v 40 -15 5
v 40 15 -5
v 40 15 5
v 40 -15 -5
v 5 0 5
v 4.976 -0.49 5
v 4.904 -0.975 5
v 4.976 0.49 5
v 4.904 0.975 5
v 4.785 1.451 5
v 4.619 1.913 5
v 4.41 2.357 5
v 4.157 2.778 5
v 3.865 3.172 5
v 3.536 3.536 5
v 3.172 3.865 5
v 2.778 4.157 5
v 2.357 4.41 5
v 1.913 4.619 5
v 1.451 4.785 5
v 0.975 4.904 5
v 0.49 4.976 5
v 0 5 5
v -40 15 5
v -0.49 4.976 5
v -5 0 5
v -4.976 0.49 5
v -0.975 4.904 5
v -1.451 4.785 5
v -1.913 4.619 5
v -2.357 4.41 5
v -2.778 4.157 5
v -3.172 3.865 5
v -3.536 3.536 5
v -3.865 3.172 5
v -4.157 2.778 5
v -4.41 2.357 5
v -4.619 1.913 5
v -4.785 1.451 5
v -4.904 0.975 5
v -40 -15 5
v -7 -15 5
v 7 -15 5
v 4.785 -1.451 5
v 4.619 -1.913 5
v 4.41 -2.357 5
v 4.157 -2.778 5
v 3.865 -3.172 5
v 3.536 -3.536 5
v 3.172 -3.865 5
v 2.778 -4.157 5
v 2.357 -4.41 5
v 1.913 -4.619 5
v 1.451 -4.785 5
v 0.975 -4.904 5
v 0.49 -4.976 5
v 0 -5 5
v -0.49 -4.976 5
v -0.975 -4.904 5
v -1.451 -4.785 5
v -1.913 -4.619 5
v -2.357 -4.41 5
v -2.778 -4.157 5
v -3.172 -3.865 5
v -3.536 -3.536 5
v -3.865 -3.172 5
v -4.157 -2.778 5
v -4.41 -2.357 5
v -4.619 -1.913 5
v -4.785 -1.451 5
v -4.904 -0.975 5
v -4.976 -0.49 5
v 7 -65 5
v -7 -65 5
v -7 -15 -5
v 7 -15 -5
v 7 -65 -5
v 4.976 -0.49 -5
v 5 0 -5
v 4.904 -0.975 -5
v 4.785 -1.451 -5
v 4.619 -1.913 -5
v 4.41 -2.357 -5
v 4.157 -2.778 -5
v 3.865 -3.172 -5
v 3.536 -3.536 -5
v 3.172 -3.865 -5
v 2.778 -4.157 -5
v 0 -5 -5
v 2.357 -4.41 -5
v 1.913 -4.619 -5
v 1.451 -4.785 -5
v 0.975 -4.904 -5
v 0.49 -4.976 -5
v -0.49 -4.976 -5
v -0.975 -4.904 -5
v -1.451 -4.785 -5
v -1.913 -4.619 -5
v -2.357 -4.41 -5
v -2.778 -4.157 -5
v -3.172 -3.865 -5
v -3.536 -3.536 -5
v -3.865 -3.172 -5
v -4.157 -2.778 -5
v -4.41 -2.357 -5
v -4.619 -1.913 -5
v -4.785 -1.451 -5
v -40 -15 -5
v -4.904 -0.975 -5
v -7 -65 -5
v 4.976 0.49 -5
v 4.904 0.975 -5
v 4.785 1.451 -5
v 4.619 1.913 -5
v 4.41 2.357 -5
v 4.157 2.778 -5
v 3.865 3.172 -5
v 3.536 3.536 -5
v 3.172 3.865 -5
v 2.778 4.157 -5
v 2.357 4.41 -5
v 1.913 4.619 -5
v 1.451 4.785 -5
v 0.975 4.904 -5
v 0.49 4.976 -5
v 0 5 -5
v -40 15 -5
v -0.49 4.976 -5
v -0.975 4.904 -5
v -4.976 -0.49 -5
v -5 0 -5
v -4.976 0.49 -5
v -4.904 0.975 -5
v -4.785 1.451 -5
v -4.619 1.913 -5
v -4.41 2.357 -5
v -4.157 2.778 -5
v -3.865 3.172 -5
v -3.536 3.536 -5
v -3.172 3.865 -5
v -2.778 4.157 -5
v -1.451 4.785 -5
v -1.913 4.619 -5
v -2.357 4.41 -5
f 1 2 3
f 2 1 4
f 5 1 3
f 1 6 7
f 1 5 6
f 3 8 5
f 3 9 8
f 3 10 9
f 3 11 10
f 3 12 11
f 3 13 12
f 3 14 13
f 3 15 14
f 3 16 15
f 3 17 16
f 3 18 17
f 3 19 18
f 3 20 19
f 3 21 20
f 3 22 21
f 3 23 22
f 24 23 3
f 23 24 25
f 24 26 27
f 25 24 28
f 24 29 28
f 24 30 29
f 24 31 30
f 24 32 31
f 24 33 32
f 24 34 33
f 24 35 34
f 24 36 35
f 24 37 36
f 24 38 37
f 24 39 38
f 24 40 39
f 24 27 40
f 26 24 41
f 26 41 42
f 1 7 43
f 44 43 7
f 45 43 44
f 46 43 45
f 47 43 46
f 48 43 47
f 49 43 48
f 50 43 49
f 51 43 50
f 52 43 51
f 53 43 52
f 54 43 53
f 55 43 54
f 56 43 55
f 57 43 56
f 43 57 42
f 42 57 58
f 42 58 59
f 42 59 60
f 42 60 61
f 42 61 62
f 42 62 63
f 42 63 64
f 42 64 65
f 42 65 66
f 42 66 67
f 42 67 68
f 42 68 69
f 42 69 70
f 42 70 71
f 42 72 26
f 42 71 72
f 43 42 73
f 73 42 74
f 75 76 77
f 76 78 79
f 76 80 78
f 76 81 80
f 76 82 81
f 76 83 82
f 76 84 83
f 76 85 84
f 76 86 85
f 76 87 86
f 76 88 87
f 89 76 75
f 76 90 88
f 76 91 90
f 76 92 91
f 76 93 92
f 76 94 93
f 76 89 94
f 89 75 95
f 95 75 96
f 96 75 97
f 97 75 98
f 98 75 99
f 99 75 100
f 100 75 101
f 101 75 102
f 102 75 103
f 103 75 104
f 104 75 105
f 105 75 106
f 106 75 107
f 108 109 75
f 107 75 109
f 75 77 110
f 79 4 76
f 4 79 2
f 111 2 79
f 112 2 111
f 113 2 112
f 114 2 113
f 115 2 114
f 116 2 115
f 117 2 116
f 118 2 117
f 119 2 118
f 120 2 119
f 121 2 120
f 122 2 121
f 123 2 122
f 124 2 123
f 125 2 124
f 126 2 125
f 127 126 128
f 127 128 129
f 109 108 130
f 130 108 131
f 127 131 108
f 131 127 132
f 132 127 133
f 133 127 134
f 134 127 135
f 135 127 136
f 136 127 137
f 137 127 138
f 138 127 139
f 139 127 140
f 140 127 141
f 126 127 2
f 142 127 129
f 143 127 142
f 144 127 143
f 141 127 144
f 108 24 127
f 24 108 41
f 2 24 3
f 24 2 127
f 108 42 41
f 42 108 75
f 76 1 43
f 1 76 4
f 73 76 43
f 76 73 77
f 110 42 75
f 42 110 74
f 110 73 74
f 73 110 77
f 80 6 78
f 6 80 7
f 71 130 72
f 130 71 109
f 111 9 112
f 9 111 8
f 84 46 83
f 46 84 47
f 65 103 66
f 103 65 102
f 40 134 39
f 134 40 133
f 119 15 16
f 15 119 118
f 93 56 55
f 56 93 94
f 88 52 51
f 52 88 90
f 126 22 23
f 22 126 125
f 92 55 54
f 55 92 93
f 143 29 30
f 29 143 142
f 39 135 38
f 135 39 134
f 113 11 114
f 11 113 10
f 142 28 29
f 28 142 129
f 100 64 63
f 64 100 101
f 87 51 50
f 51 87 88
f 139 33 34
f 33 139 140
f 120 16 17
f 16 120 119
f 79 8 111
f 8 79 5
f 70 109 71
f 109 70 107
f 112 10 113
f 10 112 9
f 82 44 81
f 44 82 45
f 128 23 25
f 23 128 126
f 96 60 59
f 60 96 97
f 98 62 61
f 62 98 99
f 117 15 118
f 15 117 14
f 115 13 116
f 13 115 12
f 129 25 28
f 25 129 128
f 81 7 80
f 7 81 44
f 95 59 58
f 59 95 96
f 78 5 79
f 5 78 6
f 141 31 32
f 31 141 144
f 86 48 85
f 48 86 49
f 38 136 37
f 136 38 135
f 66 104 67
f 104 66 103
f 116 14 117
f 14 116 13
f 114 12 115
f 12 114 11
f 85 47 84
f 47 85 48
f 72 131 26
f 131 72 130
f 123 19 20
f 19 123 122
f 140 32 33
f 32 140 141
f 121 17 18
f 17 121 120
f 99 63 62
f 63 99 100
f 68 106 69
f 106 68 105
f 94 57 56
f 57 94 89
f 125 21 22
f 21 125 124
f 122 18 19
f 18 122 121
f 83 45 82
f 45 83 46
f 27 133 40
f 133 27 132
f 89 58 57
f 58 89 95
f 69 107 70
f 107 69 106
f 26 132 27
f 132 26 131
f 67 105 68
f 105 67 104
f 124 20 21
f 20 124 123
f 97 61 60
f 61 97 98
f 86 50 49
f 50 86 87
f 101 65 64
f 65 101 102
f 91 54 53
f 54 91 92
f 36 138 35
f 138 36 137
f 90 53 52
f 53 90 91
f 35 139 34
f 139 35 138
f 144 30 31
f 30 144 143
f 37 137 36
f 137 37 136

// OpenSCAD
$fn=64;

module t_bracket(body_len=80, body_w=30, body_h=10, stem_len=50, stem_w=14, stem_h=10, hole_d=10) {
    difference() {
        union() {
            translate([0, 0, 0])
                cube([body_len, body_w, body_h], center=true);
            translate([0, -(body_w/2 + stem_len/2), 0])
                cube([stem_w, stem_len, stem_h], center=true);
        }
        translate([0, 0, 0])
            cylinder(h=body_h+2, d=hole_d, center=true);
    }
}

t_bracket();
